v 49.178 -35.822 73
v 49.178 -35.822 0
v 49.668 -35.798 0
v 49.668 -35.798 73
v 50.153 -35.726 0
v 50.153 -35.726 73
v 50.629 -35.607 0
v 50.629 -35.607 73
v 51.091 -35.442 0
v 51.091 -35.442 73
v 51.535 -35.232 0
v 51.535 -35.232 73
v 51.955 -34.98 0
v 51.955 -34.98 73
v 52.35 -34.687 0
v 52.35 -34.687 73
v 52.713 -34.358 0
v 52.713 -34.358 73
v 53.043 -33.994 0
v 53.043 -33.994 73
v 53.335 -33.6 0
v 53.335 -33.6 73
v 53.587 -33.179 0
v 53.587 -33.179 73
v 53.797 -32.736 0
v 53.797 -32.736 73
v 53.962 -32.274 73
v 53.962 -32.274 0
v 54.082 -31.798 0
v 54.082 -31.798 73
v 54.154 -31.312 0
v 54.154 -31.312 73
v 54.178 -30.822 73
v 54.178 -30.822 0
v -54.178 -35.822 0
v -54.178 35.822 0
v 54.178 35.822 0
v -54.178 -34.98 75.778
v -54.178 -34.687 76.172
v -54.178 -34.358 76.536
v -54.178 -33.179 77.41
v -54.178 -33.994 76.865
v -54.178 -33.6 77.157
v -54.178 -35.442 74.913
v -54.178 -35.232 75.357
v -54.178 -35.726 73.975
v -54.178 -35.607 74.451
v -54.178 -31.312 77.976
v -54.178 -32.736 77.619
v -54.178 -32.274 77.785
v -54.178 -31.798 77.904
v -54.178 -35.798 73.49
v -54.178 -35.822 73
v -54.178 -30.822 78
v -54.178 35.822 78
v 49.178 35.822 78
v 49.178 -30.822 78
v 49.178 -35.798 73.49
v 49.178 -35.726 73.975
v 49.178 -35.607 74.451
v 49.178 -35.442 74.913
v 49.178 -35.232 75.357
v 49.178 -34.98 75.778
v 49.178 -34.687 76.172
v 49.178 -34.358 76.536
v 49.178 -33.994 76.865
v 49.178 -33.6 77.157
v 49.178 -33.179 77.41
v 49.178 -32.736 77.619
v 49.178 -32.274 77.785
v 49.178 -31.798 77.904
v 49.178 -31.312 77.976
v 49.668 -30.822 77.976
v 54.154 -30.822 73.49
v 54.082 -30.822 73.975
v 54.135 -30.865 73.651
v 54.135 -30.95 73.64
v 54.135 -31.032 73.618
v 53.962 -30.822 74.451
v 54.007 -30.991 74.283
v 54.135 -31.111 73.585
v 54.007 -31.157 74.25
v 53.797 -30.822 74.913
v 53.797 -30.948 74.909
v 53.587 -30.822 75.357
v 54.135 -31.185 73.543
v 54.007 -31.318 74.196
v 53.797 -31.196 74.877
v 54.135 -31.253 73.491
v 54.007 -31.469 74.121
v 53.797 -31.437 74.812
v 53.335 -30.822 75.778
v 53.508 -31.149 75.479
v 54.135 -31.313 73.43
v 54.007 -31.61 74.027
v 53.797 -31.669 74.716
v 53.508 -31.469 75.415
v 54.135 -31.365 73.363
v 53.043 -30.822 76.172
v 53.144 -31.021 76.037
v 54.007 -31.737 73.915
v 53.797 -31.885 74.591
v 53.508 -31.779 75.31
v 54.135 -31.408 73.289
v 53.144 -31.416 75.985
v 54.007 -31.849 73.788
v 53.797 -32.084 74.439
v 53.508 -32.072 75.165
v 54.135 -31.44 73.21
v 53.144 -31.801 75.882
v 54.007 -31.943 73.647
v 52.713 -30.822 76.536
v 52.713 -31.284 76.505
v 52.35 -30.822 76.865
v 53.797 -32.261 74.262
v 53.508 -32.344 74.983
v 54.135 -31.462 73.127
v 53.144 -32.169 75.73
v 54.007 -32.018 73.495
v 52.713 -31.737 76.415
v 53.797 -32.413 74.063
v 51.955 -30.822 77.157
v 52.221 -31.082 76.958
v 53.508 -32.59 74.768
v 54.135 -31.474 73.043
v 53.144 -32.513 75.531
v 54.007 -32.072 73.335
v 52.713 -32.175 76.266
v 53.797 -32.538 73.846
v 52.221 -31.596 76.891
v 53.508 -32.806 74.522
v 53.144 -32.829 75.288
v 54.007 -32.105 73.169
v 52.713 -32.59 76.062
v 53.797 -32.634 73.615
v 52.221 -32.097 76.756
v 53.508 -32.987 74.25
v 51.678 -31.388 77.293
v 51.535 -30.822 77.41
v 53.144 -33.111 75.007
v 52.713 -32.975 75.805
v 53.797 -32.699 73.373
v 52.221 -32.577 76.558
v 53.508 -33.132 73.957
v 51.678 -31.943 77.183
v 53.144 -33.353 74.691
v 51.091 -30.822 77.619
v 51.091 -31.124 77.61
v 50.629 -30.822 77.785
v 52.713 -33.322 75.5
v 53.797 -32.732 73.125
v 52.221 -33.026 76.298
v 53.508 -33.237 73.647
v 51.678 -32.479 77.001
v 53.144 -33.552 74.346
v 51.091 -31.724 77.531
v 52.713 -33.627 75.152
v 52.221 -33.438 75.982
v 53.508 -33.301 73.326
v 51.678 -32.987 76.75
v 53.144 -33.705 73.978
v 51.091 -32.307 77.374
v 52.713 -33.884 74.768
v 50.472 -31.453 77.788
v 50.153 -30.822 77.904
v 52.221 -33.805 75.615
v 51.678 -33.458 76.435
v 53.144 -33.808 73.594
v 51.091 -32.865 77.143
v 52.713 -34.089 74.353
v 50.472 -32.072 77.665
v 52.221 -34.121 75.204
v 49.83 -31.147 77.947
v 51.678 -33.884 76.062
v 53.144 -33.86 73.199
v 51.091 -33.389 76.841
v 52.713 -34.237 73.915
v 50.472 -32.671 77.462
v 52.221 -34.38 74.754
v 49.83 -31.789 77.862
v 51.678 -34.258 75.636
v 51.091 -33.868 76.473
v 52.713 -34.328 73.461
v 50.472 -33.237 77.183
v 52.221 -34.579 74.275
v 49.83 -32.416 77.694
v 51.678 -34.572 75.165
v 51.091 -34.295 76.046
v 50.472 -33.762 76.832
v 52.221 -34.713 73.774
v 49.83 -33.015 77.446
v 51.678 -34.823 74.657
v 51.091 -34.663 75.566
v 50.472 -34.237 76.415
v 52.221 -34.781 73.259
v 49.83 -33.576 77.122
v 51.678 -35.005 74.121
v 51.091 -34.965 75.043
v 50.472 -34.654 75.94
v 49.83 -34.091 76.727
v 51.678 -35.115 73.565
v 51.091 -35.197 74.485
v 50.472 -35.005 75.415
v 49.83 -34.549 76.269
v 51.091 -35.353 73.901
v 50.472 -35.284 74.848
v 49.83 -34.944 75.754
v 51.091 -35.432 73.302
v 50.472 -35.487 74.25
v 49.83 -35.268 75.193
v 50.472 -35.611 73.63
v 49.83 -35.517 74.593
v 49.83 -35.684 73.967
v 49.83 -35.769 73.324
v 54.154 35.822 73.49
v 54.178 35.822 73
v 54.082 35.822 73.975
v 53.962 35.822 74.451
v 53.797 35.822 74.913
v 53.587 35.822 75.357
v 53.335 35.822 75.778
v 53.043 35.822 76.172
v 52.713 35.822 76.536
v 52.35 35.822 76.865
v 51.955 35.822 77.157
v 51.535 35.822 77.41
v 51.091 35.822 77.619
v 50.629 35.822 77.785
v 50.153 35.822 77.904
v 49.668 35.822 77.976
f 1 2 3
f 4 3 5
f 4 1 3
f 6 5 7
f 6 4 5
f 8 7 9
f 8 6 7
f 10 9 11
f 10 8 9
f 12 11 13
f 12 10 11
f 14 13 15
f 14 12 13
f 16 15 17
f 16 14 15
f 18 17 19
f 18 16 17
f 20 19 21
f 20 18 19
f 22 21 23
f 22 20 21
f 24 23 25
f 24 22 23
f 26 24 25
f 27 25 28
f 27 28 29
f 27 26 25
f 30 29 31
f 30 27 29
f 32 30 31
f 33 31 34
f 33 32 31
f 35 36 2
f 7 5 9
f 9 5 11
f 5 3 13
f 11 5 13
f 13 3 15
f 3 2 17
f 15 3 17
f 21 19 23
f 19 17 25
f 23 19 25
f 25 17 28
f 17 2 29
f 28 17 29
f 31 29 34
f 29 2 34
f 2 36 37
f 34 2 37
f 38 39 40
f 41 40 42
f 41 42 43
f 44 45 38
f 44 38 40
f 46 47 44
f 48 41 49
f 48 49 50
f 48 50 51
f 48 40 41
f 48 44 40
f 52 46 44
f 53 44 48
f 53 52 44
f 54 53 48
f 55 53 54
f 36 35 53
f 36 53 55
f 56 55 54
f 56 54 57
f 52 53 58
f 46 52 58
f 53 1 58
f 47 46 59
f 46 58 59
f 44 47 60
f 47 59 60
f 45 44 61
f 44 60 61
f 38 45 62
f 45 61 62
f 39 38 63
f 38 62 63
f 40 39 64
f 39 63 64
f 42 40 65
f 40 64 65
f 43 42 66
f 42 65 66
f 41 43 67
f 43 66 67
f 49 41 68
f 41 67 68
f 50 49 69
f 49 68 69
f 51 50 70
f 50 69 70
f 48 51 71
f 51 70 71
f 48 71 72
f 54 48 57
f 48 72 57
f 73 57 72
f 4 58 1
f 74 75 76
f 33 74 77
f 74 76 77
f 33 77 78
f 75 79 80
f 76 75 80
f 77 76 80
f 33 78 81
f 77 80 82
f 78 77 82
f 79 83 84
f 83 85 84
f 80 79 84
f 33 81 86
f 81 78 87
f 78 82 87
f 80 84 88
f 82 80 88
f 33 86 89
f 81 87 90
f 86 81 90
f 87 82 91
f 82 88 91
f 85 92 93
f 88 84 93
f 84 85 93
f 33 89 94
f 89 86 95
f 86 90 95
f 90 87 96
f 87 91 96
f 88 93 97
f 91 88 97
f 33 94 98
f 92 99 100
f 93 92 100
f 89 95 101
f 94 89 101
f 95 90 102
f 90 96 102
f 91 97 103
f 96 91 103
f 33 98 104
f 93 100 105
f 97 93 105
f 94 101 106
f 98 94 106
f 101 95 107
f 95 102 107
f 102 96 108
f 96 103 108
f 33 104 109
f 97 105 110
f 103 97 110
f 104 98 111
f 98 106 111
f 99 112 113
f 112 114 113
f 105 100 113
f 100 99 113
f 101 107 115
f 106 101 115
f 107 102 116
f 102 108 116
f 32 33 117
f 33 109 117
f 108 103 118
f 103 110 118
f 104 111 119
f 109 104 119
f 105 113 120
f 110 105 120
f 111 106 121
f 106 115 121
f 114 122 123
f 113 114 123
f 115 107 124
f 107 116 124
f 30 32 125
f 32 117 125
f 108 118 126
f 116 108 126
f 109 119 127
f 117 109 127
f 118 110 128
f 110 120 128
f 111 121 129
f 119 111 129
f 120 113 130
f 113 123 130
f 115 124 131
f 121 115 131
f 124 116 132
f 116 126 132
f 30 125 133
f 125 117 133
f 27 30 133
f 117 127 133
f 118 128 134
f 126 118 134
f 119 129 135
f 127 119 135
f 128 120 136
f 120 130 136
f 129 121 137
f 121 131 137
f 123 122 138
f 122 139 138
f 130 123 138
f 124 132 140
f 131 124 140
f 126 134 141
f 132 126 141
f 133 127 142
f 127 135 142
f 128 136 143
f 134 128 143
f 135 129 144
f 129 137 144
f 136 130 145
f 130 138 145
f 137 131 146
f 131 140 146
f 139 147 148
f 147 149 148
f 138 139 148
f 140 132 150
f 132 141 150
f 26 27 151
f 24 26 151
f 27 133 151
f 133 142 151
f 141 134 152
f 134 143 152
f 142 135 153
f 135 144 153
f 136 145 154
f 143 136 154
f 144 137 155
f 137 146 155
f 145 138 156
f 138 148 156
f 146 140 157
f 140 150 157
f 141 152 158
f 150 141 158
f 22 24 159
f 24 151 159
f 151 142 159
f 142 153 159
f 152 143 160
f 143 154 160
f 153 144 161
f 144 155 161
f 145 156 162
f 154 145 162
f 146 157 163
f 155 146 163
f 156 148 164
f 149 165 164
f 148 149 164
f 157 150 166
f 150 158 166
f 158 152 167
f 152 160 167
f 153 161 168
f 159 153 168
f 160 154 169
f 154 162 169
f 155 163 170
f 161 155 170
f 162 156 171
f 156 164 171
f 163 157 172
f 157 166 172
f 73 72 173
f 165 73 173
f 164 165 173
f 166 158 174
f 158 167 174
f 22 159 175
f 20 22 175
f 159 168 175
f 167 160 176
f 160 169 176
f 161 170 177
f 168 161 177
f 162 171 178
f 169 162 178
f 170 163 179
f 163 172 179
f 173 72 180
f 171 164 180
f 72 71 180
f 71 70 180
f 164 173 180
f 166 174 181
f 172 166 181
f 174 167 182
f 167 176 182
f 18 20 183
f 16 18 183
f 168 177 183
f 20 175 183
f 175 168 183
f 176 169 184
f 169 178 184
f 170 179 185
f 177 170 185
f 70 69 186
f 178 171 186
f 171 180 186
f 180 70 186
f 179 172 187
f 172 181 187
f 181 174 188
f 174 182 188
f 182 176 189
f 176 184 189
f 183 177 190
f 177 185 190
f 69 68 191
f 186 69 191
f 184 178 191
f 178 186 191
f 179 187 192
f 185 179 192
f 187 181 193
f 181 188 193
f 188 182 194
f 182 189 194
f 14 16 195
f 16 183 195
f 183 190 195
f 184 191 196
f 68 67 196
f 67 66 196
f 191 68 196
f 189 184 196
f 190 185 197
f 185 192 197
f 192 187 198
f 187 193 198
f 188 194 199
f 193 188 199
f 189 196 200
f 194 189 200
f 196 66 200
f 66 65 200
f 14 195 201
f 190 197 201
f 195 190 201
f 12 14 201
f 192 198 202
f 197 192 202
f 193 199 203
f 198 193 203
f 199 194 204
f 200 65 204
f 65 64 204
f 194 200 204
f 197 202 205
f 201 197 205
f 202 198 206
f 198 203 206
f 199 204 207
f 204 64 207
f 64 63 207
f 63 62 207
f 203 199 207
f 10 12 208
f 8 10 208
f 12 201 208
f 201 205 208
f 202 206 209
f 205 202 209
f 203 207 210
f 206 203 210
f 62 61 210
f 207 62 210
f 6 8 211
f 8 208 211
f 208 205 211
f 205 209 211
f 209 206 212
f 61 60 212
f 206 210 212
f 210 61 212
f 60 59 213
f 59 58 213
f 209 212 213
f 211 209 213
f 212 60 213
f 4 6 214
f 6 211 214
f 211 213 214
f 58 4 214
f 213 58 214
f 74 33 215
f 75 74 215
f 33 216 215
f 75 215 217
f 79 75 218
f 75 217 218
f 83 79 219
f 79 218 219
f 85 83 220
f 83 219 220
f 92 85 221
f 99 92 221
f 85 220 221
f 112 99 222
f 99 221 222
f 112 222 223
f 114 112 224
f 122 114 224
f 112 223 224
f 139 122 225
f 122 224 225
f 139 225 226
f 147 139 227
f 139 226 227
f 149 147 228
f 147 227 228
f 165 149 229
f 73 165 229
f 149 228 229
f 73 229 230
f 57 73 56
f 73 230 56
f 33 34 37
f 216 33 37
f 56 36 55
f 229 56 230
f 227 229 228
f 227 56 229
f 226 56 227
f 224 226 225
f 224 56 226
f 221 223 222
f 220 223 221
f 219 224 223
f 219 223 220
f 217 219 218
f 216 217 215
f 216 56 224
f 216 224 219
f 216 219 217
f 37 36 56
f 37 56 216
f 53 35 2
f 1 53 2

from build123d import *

# Parameters (mm, degrees)
F0_W     = 108.355268
F0_H     = 71.644738
F1_DEPTH = 78
F2_R     = 5


with BuildPart() as f1:
    # F0 (on Top) → F1 (new body)
    with BuildSketch(Plane.XY):
        Rectangle(F0_W, F0_H)
    extrude(amount=F1_DEPTH)

    # F2
    f2_edges = [f1.edges().sort_by_distance(p)[0] for p in [
        (0, -35.822369, 78),
        (54.177634, 0, 78),
        (54.177634, -35.822369, 39),
    ]]
    fillet(f2_edges, radius=F2_R)


solid = f1.part
